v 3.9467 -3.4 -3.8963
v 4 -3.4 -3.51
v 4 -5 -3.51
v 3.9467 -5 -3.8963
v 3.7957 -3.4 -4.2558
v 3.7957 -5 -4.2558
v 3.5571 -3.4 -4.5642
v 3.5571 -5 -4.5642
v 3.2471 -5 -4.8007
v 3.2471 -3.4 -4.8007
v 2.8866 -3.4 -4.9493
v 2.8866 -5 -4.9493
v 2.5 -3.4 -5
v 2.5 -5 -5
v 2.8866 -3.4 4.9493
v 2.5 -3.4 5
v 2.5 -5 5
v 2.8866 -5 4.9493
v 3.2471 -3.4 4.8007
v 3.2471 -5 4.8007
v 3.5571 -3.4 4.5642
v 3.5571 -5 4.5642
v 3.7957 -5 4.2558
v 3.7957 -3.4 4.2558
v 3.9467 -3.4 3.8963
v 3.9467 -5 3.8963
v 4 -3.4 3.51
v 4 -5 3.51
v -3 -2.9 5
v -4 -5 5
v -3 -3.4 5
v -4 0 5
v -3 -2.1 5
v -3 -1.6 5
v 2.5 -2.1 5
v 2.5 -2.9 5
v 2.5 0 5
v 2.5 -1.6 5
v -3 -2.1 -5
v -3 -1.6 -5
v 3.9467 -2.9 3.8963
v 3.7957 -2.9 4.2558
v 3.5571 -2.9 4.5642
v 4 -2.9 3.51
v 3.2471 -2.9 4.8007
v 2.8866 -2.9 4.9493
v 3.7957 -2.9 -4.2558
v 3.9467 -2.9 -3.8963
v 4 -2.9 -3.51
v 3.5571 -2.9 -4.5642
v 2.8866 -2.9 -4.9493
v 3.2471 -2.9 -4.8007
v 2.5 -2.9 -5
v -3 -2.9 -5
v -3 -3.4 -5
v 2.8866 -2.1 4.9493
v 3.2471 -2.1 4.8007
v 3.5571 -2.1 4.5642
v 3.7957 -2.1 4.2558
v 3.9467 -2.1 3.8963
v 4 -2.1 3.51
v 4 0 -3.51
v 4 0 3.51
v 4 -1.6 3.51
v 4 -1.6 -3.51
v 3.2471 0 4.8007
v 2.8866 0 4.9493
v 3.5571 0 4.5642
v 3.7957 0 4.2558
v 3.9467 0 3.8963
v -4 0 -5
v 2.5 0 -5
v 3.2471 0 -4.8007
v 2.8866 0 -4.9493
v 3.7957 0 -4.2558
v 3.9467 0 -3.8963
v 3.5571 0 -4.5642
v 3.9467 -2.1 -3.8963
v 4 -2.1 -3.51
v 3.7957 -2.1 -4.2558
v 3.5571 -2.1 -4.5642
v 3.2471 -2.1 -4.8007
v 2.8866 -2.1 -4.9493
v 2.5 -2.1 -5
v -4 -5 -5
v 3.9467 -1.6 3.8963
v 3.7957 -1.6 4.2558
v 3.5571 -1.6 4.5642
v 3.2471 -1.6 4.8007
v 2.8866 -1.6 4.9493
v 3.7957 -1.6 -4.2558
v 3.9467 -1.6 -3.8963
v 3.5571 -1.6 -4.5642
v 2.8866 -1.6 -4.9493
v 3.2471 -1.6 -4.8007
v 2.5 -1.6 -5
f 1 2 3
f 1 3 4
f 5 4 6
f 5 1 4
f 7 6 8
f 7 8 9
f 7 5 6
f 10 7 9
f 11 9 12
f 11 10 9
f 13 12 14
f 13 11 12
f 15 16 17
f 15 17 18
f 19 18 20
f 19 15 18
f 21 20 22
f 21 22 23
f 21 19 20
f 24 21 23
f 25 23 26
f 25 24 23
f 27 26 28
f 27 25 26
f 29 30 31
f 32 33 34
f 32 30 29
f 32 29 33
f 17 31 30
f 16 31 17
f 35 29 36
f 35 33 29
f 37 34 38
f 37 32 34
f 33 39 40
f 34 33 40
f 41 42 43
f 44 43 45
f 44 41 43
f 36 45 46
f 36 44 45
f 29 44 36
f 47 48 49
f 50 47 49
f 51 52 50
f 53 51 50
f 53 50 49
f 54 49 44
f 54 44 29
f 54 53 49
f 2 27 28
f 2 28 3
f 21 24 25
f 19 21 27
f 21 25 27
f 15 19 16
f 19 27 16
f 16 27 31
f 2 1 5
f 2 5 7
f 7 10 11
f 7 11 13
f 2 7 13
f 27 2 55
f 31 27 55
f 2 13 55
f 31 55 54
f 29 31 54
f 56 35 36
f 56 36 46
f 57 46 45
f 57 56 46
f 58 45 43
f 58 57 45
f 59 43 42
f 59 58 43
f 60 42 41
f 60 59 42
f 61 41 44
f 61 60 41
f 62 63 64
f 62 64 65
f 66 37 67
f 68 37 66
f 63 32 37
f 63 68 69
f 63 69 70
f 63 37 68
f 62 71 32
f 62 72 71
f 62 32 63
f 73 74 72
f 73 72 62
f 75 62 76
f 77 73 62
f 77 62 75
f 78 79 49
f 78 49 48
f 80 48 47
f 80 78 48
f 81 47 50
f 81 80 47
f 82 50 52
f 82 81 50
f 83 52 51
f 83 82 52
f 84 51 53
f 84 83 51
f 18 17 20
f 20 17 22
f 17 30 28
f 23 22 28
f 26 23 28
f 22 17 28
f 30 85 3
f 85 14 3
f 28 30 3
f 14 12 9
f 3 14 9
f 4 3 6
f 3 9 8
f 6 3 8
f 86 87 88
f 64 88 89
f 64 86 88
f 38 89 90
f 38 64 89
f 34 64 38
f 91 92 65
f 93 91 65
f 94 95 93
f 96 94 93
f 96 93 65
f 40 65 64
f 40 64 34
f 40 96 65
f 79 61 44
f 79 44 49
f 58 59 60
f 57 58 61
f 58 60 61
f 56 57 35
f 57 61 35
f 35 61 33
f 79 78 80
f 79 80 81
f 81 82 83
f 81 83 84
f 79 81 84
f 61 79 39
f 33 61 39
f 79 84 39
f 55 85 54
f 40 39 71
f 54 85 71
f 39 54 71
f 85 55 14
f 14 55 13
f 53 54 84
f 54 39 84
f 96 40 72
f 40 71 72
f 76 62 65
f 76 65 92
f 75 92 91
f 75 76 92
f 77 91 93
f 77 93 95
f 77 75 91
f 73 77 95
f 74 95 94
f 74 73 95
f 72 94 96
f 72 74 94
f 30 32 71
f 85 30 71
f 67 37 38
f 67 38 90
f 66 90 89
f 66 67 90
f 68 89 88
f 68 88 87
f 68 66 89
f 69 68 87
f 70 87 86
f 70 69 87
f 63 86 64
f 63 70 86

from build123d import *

# Parameters (mm, degrees)
SKETCH1_W           = 8
SKETCH1_H           = 10
BOSS_EXTRUDE1_DEPTH = 5
CUT_EXTRUDE1_REACH  = 12
SKETCH2_W           = 7
SKETCH2_H           = 0.5
CUT_EXTRUDE3_DEPTH  = 5


with BuildPart() as part:
    # Sketch1 → Boss-Extrude1 (new body)
    with BuildSketch(Plane(origin=(0, 0, 0), x_dir=(1, 0, 0), z_dir=(0, 1, 0))):
        Rectangle(SKETCH1_W, SKETCH1_H)
    extrude(amount=-BOSS_EXTRUDE1_DEPTH)

    # Sketch2 → Cut-Extrude1 (cut, up to next)
    with BuildSketch(Plane(origin=(0, 0, -5), x_dir=(-1, 0, 0), z_dir=(0, 0, -1)), mode=Mode.PRIVATE) as cut_extrude1_sk1:
        with Locations((-0.5, -1.85)):
            Rectangle(SKETCH2_W, SKETCH2_H)
    cut_extrude1_tool1 = extrude(cut_extrude1_sk1.sketch, amount=-CUT_EXTRUDE1_REACH, mode=Mode.PRIVATE) & part.part
    add(cut_extrude1_tool1.solids().sort_by_distance((0.5, -1.85, -5))[0], mode=Mode.SUBTRACT)
    # Sketch2 → Cut-Extrude1 (cut, up to next)
    with BuildSketch(Plane(origin=(0, 0, -5), x_dir=(-1, 0, 0), z_dir=(0, 0, -1)), mode=Mode.PRIVATE) as cut_extrude1_sk2:
        with Locations((-0.5, -3.15)):
            Rectangle(SKETCH2_W, SKETCH2_H)
    cut_extrude1_tool2 = extrude(cut_extrude1_sk2.sketch, amount=-CUT_EXTRUDE1_REACH, mode=Mode.PRIVATE) & part.part
    add(cut_extrude1_tool2.solids().sort_by_distance((0.5, -3.15, -5))[0], mode=Mode.SUBTRACT)

    # Sketch3 → Cut-Extrude3 (cut)
    with BuildSketch(Plane(origin=(0, 0, 0), x_dir=(1, 0, 0), z_dir=(0, 1, 0))):
        with BuildLine():
            Line((2.500033416, 5), (4, 5))
            Line((4, 5), (4, 3.510012302))
            ThreePointArc((4, 3.510012302), (3.557147777, 4.564194168), (2.500033416, 5))
        make_face()
        with BuildLine():
            Line((4, -3.510012302), (4, -5))
            Line((4, -5), (2.500033416, -5))
            ThreePointArc((2.500033416, -5), (3.557147777, -4.564194168), (4, -3.510012302))
        make_face()
    extrude(amount=-CUT_EXTRUDE3_DEPTH, mode=Mode.SUBTRACT)


solid = part.part
